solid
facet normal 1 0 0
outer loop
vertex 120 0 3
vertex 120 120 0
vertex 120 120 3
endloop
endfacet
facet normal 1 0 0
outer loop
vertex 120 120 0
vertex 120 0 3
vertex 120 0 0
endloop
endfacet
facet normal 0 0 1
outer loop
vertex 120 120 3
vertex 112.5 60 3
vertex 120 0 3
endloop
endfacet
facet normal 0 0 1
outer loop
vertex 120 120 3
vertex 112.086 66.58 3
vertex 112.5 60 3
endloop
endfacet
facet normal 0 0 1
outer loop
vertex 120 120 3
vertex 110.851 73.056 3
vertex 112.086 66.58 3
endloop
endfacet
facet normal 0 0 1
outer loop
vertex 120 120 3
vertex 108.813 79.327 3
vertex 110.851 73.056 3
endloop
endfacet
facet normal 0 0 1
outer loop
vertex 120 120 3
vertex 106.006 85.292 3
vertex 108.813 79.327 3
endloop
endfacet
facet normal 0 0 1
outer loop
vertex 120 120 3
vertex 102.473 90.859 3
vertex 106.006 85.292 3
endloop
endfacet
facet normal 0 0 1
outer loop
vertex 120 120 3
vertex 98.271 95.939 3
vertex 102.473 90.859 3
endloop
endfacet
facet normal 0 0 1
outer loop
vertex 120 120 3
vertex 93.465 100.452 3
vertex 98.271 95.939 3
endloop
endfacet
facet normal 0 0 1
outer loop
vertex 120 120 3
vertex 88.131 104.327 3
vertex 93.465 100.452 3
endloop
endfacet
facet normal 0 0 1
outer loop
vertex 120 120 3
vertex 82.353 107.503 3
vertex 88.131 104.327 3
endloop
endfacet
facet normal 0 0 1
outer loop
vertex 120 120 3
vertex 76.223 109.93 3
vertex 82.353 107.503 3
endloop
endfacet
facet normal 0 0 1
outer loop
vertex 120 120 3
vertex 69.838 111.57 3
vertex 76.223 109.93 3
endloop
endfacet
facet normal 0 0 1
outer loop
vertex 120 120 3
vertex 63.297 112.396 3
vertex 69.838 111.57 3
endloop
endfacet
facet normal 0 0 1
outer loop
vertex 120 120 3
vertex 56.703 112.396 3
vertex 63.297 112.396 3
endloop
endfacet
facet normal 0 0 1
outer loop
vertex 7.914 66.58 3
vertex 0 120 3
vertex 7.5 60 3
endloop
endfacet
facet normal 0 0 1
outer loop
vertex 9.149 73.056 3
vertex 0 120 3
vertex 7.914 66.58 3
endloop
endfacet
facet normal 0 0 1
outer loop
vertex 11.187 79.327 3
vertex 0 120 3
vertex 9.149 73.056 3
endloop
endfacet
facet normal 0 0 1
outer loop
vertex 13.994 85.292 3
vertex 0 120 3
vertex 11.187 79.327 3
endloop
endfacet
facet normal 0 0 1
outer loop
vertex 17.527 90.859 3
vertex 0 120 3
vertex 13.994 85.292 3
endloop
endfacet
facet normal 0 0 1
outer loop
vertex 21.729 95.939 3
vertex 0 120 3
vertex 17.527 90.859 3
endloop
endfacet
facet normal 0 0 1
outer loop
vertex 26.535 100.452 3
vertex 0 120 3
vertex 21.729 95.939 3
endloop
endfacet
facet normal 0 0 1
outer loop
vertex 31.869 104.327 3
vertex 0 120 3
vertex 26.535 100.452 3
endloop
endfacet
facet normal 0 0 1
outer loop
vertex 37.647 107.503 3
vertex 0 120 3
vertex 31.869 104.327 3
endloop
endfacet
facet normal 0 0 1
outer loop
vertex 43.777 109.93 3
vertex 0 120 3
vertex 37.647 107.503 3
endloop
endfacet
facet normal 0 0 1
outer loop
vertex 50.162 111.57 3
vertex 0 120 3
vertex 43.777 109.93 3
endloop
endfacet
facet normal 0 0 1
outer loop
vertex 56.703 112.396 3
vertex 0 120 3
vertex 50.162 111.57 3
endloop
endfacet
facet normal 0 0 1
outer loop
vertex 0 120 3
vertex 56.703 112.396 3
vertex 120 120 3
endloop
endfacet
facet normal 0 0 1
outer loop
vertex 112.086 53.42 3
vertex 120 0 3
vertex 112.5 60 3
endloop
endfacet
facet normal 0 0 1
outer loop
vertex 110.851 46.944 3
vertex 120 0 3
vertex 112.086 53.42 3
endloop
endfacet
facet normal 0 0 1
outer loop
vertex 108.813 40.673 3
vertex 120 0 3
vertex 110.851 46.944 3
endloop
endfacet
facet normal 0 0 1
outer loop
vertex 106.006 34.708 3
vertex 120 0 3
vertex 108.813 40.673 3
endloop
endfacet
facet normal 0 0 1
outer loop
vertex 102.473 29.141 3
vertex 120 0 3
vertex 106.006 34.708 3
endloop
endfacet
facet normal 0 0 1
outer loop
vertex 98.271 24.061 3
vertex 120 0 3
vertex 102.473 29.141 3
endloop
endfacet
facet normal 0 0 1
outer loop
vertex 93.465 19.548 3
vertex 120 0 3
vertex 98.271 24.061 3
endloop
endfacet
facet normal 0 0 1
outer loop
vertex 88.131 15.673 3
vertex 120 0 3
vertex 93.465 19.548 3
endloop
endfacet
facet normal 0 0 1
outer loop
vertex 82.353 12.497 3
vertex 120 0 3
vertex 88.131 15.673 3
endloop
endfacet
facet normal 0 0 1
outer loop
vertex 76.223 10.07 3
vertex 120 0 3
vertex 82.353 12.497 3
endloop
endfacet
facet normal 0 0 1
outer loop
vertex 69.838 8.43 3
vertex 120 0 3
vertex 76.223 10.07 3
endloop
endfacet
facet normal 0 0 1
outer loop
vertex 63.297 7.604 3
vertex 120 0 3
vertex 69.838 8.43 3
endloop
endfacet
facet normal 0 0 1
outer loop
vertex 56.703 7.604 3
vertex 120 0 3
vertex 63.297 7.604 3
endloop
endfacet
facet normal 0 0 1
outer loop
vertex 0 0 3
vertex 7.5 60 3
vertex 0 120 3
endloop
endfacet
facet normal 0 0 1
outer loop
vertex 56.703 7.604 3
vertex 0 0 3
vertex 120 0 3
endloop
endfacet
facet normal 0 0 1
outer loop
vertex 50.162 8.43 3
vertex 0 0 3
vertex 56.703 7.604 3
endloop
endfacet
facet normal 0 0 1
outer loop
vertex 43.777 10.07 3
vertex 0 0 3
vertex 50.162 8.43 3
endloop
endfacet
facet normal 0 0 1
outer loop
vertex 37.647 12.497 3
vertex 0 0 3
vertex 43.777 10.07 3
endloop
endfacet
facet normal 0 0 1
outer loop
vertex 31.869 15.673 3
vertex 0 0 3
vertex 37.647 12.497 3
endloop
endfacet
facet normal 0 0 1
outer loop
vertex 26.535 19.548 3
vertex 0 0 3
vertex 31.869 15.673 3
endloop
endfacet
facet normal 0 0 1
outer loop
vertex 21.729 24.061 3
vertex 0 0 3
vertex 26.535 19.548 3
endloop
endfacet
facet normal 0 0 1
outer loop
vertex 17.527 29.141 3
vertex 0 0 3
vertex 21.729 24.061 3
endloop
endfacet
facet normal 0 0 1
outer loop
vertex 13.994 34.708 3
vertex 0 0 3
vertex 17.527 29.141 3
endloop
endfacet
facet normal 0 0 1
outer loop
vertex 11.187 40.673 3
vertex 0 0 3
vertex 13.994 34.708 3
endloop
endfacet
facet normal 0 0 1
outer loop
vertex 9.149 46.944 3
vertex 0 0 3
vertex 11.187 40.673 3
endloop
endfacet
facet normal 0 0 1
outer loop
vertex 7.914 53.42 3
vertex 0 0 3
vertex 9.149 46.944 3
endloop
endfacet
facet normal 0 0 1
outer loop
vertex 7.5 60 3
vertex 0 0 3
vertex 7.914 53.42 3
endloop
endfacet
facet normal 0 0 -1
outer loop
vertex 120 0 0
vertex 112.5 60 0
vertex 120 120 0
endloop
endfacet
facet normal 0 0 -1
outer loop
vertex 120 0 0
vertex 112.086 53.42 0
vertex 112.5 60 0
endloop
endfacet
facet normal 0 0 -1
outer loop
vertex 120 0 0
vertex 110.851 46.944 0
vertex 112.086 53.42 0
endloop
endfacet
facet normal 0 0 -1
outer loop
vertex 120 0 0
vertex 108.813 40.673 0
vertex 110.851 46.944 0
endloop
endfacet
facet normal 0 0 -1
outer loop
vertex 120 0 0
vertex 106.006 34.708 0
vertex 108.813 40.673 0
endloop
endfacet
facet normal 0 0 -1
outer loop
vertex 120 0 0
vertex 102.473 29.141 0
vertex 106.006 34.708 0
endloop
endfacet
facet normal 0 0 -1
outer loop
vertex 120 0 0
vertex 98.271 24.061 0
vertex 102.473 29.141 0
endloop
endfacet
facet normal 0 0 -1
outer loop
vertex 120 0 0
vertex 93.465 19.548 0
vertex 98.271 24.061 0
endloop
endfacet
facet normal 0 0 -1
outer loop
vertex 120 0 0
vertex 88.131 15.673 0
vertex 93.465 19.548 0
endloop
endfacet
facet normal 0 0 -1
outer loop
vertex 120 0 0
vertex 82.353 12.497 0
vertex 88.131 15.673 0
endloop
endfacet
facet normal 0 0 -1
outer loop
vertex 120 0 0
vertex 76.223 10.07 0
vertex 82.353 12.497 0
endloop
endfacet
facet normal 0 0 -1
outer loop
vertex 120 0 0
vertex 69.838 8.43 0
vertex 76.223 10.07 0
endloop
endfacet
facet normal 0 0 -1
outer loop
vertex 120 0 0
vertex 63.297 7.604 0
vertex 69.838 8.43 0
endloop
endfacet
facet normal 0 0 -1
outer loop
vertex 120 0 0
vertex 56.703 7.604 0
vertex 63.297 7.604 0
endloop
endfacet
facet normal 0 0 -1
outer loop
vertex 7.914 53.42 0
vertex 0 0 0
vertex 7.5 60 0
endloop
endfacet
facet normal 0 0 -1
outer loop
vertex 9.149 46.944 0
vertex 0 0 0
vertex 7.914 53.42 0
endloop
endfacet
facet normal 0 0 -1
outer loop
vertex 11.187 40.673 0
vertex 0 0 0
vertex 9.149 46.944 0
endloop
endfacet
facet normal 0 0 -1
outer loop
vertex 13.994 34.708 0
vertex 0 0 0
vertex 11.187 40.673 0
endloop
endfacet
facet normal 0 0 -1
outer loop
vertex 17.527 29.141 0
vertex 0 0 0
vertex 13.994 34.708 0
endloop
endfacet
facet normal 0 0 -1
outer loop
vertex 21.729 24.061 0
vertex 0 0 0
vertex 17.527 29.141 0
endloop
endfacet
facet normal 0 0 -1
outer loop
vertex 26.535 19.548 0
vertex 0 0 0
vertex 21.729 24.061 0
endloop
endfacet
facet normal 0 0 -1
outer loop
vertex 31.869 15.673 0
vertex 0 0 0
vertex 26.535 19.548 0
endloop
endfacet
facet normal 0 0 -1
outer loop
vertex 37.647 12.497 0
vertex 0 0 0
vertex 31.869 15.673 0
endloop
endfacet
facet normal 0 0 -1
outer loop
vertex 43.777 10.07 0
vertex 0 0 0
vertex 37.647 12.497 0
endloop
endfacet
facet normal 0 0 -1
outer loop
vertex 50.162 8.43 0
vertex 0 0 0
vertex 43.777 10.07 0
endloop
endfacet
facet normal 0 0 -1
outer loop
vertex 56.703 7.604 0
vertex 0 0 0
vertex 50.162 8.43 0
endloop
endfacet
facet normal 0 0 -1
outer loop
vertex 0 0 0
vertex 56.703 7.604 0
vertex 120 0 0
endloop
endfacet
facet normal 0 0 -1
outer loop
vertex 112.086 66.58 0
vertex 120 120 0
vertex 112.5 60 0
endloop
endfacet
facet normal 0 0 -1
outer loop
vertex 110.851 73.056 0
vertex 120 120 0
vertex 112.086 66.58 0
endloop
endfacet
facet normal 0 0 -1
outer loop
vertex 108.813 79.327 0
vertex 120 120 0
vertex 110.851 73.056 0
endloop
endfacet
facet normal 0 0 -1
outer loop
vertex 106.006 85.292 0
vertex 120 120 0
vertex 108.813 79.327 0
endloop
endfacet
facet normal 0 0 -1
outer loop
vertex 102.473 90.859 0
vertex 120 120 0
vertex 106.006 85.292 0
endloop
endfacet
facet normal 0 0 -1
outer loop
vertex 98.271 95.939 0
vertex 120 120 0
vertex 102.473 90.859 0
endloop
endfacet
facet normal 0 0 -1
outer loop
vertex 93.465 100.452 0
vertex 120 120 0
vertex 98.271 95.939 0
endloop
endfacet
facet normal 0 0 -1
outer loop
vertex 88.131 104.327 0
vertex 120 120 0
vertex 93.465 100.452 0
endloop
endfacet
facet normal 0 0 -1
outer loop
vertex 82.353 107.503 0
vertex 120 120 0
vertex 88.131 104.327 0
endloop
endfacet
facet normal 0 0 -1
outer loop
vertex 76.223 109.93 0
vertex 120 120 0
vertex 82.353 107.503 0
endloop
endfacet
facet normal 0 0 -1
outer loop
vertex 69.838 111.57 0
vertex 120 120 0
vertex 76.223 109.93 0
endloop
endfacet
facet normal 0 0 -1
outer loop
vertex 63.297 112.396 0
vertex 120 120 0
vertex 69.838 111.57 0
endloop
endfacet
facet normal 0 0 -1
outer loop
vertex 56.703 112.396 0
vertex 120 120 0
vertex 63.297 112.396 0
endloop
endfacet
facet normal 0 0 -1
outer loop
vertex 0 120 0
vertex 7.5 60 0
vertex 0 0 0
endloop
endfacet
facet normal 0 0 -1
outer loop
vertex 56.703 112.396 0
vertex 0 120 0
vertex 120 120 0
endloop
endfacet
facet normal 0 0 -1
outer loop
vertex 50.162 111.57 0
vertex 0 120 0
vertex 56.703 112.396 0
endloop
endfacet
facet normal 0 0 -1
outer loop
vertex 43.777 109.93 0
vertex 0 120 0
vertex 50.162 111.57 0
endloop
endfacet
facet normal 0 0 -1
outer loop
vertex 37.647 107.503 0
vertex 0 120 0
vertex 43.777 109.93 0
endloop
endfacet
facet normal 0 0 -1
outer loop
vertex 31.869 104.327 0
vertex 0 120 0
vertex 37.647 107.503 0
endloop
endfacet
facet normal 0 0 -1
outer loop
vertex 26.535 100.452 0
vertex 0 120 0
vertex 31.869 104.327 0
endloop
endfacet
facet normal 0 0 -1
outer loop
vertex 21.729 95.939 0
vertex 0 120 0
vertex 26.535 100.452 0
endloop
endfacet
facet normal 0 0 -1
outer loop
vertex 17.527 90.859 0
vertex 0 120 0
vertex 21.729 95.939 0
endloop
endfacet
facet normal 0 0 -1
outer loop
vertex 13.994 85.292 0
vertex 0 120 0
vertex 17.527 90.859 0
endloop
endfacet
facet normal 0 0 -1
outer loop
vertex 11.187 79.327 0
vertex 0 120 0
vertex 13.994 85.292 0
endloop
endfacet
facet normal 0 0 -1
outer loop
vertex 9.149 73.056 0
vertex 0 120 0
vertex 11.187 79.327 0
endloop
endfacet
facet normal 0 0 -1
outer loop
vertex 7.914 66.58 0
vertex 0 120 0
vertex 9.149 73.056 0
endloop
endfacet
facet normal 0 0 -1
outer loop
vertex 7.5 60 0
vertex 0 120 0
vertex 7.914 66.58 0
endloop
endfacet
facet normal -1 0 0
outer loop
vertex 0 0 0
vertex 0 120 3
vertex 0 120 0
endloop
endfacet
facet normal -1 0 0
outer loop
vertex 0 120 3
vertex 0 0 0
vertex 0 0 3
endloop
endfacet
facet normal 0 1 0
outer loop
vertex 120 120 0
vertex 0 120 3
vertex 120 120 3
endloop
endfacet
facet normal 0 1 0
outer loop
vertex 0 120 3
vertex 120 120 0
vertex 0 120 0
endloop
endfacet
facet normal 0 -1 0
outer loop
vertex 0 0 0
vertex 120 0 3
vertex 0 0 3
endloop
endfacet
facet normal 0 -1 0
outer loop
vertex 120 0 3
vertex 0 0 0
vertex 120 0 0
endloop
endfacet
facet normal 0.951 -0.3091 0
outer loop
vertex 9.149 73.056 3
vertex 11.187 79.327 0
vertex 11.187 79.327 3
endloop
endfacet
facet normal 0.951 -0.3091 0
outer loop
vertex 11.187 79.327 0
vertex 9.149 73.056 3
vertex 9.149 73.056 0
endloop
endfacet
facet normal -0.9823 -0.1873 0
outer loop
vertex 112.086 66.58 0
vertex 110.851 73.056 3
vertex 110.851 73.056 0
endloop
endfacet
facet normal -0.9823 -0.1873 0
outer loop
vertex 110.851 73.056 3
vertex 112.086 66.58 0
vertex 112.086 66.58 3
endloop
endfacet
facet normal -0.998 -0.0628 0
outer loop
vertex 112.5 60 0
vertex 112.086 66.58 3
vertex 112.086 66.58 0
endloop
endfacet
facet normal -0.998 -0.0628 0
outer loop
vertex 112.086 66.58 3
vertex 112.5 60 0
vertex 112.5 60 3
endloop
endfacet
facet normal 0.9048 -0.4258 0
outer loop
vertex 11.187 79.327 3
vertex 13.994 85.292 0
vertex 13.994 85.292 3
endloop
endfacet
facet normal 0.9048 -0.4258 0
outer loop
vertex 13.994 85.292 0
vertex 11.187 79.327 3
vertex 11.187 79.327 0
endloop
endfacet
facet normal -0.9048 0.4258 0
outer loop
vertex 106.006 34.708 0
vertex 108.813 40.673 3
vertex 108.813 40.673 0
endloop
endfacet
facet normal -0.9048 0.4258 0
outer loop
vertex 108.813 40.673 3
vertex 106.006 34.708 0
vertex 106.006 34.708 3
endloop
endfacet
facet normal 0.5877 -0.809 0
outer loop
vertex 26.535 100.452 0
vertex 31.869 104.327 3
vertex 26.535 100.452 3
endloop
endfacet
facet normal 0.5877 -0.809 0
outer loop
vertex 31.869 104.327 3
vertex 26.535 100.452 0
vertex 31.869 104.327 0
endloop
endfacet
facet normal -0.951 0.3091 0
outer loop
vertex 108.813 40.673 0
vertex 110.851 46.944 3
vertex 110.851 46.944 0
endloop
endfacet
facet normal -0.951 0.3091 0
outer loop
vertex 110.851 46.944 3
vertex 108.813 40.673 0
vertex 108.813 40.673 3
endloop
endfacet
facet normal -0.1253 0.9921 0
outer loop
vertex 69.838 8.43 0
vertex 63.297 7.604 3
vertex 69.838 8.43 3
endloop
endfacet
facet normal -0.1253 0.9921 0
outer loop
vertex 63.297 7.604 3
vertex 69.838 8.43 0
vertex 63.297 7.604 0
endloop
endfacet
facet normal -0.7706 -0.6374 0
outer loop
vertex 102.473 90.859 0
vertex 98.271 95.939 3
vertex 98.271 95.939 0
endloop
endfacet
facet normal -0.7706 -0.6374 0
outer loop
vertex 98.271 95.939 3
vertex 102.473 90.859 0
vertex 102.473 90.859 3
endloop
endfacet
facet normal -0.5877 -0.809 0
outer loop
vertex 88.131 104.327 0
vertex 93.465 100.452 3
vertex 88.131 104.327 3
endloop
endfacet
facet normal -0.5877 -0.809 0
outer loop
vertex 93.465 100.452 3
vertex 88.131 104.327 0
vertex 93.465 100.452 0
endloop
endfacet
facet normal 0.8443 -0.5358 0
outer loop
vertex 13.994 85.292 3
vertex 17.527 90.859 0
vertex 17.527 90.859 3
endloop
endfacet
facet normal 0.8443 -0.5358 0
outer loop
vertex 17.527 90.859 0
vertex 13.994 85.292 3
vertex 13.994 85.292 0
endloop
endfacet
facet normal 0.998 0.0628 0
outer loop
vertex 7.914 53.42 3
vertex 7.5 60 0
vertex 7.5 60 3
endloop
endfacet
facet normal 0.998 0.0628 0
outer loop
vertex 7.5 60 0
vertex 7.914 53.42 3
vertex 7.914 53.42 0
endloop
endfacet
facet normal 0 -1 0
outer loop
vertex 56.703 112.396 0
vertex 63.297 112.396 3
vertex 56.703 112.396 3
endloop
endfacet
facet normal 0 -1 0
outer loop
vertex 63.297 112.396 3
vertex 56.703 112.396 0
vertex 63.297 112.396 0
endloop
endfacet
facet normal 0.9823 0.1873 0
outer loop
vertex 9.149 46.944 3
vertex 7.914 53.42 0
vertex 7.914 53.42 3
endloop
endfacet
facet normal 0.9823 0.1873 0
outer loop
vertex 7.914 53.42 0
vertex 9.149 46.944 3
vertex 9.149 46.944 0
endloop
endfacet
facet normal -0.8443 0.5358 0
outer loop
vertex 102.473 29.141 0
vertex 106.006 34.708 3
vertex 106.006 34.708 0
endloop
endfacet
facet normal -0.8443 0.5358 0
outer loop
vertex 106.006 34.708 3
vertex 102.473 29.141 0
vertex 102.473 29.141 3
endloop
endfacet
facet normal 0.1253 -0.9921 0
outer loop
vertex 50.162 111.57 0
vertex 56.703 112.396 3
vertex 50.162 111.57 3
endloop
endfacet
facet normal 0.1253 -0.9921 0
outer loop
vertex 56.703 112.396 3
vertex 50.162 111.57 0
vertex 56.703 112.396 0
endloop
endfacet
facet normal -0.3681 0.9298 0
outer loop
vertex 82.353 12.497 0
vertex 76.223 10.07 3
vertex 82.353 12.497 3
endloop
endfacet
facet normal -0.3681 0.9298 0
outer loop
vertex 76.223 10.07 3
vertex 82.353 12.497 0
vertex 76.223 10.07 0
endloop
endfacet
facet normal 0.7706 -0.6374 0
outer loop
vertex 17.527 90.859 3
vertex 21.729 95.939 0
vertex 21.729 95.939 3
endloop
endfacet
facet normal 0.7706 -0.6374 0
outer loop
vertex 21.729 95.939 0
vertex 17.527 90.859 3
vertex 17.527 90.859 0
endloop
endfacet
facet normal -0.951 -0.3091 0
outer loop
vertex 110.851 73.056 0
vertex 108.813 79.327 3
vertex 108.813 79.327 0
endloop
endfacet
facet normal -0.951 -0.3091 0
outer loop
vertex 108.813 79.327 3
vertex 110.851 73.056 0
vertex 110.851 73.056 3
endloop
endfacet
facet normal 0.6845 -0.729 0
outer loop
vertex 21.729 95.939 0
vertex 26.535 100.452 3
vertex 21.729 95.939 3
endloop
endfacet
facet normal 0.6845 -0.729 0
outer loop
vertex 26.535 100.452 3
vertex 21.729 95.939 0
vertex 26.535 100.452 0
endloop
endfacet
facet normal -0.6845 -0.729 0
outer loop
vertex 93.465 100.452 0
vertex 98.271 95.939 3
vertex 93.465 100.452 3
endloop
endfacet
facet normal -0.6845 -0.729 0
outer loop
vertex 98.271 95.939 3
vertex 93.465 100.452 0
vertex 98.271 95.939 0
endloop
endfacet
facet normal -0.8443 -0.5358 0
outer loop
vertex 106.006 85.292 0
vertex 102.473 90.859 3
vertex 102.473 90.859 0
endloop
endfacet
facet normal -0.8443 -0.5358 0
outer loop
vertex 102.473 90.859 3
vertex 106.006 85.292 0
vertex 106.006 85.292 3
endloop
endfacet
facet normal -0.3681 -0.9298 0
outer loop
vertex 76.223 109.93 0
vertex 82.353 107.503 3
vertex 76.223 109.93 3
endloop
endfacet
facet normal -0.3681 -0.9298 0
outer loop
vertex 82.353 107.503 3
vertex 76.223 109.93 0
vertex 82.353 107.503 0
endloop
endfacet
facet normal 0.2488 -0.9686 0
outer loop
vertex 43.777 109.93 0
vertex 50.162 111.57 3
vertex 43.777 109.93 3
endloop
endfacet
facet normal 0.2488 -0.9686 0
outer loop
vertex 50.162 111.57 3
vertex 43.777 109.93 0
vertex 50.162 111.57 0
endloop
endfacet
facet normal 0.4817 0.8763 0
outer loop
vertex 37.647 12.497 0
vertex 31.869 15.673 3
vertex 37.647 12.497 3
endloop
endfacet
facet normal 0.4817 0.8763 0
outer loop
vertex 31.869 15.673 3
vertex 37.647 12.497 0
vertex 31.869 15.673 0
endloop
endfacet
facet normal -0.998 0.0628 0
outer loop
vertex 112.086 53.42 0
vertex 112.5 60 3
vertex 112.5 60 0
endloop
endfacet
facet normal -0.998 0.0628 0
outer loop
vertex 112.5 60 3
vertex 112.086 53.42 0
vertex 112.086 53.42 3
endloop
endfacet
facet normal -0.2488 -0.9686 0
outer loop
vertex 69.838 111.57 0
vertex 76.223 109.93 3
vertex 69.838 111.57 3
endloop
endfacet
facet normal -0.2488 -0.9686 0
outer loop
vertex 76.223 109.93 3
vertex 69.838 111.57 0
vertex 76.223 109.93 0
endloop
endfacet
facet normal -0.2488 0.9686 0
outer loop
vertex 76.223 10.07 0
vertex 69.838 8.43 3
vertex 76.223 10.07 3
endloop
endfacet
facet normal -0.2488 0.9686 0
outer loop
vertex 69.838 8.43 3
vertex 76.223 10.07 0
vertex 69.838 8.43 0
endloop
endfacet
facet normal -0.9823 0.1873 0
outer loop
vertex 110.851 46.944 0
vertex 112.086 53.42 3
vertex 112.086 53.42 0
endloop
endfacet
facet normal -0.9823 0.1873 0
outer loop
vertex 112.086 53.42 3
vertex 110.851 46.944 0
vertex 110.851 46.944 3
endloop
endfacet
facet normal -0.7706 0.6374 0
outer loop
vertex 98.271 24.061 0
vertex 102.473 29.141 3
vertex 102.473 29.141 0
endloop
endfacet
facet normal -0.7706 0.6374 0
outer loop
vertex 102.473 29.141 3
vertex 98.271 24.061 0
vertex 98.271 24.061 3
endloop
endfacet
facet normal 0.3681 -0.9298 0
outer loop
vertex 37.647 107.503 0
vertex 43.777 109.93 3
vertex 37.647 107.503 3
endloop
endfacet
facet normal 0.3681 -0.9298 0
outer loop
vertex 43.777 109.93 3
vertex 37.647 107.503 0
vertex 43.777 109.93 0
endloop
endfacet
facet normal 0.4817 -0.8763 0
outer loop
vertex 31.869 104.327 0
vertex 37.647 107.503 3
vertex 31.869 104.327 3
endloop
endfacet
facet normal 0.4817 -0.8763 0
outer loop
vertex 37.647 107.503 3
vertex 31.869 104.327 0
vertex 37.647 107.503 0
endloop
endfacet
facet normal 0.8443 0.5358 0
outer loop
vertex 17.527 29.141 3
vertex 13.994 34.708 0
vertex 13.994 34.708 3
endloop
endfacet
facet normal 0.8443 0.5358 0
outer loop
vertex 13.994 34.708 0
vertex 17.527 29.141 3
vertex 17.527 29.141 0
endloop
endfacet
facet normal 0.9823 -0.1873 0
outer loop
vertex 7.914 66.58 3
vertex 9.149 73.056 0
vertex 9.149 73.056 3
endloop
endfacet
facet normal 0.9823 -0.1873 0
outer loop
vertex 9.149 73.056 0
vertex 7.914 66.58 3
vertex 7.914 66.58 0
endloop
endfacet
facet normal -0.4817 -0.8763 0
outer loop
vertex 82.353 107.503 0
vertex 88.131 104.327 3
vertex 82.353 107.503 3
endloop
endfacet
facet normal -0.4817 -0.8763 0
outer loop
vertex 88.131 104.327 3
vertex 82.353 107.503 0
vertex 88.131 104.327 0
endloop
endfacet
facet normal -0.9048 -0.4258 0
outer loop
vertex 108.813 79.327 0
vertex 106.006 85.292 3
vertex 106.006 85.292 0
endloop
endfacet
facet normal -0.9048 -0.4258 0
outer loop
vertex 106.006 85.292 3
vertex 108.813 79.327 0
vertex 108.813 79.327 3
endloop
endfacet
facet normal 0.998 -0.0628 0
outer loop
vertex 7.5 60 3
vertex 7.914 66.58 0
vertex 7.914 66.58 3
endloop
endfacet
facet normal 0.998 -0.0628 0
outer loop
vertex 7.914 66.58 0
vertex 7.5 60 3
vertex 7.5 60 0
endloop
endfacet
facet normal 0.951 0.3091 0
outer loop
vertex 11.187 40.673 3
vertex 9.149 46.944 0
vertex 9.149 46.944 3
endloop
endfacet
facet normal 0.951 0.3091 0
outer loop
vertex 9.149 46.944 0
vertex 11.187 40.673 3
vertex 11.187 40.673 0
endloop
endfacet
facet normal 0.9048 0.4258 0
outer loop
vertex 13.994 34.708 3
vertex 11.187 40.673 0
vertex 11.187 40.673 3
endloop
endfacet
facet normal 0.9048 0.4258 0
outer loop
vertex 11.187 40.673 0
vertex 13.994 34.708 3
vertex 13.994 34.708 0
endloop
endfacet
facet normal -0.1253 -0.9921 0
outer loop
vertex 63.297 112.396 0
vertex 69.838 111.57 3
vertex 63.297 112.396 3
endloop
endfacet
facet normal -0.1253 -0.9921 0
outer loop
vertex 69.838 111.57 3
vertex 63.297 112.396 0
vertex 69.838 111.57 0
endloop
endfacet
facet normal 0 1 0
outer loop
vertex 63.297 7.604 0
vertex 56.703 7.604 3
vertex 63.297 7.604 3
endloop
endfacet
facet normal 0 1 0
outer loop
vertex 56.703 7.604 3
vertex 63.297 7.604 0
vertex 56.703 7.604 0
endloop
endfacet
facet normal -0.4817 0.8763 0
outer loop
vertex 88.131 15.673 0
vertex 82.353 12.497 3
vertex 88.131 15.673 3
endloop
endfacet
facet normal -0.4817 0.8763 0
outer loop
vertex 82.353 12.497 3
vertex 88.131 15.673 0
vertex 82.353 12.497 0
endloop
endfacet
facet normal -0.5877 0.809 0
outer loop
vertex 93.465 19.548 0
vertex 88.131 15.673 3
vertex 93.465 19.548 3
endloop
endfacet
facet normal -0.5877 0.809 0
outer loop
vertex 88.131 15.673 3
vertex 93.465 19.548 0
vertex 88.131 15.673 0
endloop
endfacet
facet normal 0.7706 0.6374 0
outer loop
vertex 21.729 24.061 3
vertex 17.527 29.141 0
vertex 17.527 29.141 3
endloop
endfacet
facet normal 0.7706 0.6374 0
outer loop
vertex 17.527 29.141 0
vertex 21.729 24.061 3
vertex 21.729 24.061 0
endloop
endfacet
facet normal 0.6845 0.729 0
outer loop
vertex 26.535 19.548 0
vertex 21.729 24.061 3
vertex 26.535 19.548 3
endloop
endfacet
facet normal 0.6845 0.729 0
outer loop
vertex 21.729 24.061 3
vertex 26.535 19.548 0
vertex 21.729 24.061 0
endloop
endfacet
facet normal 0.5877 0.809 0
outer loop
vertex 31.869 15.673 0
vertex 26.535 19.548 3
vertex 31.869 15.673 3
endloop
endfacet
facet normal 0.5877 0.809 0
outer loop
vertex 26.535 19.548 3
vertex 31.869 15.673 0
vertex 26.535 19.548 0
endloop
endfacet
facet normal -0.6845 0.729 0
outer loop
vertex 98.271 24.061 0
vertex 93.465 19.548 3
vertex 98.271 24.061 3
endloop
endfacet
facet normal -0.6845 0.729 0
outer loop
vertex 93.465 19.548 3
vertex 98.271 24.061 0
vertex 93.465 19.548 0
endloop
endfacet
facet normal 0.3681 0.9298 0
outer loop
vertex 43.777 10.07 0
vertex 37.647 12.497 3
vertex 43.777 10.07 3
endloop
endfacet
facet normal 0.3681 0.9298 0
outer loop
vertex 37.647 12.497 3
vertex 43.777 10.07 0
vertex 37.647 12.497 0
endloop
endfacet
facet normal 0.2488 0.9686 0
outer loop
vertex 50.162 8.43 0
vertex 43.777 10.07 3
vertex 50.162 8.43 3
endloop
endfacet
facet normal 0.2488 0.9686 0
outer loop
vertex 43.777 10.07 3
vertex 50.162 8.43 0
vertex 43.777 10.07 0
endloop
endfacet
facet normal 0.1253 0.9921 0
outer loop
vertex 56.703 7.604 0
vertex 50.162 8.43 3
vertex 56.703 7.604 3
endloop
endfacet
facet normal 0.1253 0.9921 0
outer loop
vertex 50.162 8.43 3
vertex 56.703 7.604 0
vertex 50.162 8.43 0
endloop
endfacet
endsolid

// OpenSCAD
//
// USBカメラ用固定板
//
// USBcameraBaseplate-1-20260210A.scad
//
// Last update: 2026-02-10(Tue) 07:54 JST / 2026-02-09(Mon) 22:54 UTC
//

// パネルサイズと穴位置
Px = 120.0; Py = 120.0; Pz = 3.0;   // 縦・横・厚
Hd = 105.0  ;                       // 穴径。ちょっと大きめ


// ベースパネルに  穴4つ（角から Hp だけ内側に）
difference() {
  cube([Px, Py, Pz]);
      translate([Px/2, Py/2, -1.0])
        cylinder(h = Pz + 2.0, d = Hd, $fn = 50);
}
